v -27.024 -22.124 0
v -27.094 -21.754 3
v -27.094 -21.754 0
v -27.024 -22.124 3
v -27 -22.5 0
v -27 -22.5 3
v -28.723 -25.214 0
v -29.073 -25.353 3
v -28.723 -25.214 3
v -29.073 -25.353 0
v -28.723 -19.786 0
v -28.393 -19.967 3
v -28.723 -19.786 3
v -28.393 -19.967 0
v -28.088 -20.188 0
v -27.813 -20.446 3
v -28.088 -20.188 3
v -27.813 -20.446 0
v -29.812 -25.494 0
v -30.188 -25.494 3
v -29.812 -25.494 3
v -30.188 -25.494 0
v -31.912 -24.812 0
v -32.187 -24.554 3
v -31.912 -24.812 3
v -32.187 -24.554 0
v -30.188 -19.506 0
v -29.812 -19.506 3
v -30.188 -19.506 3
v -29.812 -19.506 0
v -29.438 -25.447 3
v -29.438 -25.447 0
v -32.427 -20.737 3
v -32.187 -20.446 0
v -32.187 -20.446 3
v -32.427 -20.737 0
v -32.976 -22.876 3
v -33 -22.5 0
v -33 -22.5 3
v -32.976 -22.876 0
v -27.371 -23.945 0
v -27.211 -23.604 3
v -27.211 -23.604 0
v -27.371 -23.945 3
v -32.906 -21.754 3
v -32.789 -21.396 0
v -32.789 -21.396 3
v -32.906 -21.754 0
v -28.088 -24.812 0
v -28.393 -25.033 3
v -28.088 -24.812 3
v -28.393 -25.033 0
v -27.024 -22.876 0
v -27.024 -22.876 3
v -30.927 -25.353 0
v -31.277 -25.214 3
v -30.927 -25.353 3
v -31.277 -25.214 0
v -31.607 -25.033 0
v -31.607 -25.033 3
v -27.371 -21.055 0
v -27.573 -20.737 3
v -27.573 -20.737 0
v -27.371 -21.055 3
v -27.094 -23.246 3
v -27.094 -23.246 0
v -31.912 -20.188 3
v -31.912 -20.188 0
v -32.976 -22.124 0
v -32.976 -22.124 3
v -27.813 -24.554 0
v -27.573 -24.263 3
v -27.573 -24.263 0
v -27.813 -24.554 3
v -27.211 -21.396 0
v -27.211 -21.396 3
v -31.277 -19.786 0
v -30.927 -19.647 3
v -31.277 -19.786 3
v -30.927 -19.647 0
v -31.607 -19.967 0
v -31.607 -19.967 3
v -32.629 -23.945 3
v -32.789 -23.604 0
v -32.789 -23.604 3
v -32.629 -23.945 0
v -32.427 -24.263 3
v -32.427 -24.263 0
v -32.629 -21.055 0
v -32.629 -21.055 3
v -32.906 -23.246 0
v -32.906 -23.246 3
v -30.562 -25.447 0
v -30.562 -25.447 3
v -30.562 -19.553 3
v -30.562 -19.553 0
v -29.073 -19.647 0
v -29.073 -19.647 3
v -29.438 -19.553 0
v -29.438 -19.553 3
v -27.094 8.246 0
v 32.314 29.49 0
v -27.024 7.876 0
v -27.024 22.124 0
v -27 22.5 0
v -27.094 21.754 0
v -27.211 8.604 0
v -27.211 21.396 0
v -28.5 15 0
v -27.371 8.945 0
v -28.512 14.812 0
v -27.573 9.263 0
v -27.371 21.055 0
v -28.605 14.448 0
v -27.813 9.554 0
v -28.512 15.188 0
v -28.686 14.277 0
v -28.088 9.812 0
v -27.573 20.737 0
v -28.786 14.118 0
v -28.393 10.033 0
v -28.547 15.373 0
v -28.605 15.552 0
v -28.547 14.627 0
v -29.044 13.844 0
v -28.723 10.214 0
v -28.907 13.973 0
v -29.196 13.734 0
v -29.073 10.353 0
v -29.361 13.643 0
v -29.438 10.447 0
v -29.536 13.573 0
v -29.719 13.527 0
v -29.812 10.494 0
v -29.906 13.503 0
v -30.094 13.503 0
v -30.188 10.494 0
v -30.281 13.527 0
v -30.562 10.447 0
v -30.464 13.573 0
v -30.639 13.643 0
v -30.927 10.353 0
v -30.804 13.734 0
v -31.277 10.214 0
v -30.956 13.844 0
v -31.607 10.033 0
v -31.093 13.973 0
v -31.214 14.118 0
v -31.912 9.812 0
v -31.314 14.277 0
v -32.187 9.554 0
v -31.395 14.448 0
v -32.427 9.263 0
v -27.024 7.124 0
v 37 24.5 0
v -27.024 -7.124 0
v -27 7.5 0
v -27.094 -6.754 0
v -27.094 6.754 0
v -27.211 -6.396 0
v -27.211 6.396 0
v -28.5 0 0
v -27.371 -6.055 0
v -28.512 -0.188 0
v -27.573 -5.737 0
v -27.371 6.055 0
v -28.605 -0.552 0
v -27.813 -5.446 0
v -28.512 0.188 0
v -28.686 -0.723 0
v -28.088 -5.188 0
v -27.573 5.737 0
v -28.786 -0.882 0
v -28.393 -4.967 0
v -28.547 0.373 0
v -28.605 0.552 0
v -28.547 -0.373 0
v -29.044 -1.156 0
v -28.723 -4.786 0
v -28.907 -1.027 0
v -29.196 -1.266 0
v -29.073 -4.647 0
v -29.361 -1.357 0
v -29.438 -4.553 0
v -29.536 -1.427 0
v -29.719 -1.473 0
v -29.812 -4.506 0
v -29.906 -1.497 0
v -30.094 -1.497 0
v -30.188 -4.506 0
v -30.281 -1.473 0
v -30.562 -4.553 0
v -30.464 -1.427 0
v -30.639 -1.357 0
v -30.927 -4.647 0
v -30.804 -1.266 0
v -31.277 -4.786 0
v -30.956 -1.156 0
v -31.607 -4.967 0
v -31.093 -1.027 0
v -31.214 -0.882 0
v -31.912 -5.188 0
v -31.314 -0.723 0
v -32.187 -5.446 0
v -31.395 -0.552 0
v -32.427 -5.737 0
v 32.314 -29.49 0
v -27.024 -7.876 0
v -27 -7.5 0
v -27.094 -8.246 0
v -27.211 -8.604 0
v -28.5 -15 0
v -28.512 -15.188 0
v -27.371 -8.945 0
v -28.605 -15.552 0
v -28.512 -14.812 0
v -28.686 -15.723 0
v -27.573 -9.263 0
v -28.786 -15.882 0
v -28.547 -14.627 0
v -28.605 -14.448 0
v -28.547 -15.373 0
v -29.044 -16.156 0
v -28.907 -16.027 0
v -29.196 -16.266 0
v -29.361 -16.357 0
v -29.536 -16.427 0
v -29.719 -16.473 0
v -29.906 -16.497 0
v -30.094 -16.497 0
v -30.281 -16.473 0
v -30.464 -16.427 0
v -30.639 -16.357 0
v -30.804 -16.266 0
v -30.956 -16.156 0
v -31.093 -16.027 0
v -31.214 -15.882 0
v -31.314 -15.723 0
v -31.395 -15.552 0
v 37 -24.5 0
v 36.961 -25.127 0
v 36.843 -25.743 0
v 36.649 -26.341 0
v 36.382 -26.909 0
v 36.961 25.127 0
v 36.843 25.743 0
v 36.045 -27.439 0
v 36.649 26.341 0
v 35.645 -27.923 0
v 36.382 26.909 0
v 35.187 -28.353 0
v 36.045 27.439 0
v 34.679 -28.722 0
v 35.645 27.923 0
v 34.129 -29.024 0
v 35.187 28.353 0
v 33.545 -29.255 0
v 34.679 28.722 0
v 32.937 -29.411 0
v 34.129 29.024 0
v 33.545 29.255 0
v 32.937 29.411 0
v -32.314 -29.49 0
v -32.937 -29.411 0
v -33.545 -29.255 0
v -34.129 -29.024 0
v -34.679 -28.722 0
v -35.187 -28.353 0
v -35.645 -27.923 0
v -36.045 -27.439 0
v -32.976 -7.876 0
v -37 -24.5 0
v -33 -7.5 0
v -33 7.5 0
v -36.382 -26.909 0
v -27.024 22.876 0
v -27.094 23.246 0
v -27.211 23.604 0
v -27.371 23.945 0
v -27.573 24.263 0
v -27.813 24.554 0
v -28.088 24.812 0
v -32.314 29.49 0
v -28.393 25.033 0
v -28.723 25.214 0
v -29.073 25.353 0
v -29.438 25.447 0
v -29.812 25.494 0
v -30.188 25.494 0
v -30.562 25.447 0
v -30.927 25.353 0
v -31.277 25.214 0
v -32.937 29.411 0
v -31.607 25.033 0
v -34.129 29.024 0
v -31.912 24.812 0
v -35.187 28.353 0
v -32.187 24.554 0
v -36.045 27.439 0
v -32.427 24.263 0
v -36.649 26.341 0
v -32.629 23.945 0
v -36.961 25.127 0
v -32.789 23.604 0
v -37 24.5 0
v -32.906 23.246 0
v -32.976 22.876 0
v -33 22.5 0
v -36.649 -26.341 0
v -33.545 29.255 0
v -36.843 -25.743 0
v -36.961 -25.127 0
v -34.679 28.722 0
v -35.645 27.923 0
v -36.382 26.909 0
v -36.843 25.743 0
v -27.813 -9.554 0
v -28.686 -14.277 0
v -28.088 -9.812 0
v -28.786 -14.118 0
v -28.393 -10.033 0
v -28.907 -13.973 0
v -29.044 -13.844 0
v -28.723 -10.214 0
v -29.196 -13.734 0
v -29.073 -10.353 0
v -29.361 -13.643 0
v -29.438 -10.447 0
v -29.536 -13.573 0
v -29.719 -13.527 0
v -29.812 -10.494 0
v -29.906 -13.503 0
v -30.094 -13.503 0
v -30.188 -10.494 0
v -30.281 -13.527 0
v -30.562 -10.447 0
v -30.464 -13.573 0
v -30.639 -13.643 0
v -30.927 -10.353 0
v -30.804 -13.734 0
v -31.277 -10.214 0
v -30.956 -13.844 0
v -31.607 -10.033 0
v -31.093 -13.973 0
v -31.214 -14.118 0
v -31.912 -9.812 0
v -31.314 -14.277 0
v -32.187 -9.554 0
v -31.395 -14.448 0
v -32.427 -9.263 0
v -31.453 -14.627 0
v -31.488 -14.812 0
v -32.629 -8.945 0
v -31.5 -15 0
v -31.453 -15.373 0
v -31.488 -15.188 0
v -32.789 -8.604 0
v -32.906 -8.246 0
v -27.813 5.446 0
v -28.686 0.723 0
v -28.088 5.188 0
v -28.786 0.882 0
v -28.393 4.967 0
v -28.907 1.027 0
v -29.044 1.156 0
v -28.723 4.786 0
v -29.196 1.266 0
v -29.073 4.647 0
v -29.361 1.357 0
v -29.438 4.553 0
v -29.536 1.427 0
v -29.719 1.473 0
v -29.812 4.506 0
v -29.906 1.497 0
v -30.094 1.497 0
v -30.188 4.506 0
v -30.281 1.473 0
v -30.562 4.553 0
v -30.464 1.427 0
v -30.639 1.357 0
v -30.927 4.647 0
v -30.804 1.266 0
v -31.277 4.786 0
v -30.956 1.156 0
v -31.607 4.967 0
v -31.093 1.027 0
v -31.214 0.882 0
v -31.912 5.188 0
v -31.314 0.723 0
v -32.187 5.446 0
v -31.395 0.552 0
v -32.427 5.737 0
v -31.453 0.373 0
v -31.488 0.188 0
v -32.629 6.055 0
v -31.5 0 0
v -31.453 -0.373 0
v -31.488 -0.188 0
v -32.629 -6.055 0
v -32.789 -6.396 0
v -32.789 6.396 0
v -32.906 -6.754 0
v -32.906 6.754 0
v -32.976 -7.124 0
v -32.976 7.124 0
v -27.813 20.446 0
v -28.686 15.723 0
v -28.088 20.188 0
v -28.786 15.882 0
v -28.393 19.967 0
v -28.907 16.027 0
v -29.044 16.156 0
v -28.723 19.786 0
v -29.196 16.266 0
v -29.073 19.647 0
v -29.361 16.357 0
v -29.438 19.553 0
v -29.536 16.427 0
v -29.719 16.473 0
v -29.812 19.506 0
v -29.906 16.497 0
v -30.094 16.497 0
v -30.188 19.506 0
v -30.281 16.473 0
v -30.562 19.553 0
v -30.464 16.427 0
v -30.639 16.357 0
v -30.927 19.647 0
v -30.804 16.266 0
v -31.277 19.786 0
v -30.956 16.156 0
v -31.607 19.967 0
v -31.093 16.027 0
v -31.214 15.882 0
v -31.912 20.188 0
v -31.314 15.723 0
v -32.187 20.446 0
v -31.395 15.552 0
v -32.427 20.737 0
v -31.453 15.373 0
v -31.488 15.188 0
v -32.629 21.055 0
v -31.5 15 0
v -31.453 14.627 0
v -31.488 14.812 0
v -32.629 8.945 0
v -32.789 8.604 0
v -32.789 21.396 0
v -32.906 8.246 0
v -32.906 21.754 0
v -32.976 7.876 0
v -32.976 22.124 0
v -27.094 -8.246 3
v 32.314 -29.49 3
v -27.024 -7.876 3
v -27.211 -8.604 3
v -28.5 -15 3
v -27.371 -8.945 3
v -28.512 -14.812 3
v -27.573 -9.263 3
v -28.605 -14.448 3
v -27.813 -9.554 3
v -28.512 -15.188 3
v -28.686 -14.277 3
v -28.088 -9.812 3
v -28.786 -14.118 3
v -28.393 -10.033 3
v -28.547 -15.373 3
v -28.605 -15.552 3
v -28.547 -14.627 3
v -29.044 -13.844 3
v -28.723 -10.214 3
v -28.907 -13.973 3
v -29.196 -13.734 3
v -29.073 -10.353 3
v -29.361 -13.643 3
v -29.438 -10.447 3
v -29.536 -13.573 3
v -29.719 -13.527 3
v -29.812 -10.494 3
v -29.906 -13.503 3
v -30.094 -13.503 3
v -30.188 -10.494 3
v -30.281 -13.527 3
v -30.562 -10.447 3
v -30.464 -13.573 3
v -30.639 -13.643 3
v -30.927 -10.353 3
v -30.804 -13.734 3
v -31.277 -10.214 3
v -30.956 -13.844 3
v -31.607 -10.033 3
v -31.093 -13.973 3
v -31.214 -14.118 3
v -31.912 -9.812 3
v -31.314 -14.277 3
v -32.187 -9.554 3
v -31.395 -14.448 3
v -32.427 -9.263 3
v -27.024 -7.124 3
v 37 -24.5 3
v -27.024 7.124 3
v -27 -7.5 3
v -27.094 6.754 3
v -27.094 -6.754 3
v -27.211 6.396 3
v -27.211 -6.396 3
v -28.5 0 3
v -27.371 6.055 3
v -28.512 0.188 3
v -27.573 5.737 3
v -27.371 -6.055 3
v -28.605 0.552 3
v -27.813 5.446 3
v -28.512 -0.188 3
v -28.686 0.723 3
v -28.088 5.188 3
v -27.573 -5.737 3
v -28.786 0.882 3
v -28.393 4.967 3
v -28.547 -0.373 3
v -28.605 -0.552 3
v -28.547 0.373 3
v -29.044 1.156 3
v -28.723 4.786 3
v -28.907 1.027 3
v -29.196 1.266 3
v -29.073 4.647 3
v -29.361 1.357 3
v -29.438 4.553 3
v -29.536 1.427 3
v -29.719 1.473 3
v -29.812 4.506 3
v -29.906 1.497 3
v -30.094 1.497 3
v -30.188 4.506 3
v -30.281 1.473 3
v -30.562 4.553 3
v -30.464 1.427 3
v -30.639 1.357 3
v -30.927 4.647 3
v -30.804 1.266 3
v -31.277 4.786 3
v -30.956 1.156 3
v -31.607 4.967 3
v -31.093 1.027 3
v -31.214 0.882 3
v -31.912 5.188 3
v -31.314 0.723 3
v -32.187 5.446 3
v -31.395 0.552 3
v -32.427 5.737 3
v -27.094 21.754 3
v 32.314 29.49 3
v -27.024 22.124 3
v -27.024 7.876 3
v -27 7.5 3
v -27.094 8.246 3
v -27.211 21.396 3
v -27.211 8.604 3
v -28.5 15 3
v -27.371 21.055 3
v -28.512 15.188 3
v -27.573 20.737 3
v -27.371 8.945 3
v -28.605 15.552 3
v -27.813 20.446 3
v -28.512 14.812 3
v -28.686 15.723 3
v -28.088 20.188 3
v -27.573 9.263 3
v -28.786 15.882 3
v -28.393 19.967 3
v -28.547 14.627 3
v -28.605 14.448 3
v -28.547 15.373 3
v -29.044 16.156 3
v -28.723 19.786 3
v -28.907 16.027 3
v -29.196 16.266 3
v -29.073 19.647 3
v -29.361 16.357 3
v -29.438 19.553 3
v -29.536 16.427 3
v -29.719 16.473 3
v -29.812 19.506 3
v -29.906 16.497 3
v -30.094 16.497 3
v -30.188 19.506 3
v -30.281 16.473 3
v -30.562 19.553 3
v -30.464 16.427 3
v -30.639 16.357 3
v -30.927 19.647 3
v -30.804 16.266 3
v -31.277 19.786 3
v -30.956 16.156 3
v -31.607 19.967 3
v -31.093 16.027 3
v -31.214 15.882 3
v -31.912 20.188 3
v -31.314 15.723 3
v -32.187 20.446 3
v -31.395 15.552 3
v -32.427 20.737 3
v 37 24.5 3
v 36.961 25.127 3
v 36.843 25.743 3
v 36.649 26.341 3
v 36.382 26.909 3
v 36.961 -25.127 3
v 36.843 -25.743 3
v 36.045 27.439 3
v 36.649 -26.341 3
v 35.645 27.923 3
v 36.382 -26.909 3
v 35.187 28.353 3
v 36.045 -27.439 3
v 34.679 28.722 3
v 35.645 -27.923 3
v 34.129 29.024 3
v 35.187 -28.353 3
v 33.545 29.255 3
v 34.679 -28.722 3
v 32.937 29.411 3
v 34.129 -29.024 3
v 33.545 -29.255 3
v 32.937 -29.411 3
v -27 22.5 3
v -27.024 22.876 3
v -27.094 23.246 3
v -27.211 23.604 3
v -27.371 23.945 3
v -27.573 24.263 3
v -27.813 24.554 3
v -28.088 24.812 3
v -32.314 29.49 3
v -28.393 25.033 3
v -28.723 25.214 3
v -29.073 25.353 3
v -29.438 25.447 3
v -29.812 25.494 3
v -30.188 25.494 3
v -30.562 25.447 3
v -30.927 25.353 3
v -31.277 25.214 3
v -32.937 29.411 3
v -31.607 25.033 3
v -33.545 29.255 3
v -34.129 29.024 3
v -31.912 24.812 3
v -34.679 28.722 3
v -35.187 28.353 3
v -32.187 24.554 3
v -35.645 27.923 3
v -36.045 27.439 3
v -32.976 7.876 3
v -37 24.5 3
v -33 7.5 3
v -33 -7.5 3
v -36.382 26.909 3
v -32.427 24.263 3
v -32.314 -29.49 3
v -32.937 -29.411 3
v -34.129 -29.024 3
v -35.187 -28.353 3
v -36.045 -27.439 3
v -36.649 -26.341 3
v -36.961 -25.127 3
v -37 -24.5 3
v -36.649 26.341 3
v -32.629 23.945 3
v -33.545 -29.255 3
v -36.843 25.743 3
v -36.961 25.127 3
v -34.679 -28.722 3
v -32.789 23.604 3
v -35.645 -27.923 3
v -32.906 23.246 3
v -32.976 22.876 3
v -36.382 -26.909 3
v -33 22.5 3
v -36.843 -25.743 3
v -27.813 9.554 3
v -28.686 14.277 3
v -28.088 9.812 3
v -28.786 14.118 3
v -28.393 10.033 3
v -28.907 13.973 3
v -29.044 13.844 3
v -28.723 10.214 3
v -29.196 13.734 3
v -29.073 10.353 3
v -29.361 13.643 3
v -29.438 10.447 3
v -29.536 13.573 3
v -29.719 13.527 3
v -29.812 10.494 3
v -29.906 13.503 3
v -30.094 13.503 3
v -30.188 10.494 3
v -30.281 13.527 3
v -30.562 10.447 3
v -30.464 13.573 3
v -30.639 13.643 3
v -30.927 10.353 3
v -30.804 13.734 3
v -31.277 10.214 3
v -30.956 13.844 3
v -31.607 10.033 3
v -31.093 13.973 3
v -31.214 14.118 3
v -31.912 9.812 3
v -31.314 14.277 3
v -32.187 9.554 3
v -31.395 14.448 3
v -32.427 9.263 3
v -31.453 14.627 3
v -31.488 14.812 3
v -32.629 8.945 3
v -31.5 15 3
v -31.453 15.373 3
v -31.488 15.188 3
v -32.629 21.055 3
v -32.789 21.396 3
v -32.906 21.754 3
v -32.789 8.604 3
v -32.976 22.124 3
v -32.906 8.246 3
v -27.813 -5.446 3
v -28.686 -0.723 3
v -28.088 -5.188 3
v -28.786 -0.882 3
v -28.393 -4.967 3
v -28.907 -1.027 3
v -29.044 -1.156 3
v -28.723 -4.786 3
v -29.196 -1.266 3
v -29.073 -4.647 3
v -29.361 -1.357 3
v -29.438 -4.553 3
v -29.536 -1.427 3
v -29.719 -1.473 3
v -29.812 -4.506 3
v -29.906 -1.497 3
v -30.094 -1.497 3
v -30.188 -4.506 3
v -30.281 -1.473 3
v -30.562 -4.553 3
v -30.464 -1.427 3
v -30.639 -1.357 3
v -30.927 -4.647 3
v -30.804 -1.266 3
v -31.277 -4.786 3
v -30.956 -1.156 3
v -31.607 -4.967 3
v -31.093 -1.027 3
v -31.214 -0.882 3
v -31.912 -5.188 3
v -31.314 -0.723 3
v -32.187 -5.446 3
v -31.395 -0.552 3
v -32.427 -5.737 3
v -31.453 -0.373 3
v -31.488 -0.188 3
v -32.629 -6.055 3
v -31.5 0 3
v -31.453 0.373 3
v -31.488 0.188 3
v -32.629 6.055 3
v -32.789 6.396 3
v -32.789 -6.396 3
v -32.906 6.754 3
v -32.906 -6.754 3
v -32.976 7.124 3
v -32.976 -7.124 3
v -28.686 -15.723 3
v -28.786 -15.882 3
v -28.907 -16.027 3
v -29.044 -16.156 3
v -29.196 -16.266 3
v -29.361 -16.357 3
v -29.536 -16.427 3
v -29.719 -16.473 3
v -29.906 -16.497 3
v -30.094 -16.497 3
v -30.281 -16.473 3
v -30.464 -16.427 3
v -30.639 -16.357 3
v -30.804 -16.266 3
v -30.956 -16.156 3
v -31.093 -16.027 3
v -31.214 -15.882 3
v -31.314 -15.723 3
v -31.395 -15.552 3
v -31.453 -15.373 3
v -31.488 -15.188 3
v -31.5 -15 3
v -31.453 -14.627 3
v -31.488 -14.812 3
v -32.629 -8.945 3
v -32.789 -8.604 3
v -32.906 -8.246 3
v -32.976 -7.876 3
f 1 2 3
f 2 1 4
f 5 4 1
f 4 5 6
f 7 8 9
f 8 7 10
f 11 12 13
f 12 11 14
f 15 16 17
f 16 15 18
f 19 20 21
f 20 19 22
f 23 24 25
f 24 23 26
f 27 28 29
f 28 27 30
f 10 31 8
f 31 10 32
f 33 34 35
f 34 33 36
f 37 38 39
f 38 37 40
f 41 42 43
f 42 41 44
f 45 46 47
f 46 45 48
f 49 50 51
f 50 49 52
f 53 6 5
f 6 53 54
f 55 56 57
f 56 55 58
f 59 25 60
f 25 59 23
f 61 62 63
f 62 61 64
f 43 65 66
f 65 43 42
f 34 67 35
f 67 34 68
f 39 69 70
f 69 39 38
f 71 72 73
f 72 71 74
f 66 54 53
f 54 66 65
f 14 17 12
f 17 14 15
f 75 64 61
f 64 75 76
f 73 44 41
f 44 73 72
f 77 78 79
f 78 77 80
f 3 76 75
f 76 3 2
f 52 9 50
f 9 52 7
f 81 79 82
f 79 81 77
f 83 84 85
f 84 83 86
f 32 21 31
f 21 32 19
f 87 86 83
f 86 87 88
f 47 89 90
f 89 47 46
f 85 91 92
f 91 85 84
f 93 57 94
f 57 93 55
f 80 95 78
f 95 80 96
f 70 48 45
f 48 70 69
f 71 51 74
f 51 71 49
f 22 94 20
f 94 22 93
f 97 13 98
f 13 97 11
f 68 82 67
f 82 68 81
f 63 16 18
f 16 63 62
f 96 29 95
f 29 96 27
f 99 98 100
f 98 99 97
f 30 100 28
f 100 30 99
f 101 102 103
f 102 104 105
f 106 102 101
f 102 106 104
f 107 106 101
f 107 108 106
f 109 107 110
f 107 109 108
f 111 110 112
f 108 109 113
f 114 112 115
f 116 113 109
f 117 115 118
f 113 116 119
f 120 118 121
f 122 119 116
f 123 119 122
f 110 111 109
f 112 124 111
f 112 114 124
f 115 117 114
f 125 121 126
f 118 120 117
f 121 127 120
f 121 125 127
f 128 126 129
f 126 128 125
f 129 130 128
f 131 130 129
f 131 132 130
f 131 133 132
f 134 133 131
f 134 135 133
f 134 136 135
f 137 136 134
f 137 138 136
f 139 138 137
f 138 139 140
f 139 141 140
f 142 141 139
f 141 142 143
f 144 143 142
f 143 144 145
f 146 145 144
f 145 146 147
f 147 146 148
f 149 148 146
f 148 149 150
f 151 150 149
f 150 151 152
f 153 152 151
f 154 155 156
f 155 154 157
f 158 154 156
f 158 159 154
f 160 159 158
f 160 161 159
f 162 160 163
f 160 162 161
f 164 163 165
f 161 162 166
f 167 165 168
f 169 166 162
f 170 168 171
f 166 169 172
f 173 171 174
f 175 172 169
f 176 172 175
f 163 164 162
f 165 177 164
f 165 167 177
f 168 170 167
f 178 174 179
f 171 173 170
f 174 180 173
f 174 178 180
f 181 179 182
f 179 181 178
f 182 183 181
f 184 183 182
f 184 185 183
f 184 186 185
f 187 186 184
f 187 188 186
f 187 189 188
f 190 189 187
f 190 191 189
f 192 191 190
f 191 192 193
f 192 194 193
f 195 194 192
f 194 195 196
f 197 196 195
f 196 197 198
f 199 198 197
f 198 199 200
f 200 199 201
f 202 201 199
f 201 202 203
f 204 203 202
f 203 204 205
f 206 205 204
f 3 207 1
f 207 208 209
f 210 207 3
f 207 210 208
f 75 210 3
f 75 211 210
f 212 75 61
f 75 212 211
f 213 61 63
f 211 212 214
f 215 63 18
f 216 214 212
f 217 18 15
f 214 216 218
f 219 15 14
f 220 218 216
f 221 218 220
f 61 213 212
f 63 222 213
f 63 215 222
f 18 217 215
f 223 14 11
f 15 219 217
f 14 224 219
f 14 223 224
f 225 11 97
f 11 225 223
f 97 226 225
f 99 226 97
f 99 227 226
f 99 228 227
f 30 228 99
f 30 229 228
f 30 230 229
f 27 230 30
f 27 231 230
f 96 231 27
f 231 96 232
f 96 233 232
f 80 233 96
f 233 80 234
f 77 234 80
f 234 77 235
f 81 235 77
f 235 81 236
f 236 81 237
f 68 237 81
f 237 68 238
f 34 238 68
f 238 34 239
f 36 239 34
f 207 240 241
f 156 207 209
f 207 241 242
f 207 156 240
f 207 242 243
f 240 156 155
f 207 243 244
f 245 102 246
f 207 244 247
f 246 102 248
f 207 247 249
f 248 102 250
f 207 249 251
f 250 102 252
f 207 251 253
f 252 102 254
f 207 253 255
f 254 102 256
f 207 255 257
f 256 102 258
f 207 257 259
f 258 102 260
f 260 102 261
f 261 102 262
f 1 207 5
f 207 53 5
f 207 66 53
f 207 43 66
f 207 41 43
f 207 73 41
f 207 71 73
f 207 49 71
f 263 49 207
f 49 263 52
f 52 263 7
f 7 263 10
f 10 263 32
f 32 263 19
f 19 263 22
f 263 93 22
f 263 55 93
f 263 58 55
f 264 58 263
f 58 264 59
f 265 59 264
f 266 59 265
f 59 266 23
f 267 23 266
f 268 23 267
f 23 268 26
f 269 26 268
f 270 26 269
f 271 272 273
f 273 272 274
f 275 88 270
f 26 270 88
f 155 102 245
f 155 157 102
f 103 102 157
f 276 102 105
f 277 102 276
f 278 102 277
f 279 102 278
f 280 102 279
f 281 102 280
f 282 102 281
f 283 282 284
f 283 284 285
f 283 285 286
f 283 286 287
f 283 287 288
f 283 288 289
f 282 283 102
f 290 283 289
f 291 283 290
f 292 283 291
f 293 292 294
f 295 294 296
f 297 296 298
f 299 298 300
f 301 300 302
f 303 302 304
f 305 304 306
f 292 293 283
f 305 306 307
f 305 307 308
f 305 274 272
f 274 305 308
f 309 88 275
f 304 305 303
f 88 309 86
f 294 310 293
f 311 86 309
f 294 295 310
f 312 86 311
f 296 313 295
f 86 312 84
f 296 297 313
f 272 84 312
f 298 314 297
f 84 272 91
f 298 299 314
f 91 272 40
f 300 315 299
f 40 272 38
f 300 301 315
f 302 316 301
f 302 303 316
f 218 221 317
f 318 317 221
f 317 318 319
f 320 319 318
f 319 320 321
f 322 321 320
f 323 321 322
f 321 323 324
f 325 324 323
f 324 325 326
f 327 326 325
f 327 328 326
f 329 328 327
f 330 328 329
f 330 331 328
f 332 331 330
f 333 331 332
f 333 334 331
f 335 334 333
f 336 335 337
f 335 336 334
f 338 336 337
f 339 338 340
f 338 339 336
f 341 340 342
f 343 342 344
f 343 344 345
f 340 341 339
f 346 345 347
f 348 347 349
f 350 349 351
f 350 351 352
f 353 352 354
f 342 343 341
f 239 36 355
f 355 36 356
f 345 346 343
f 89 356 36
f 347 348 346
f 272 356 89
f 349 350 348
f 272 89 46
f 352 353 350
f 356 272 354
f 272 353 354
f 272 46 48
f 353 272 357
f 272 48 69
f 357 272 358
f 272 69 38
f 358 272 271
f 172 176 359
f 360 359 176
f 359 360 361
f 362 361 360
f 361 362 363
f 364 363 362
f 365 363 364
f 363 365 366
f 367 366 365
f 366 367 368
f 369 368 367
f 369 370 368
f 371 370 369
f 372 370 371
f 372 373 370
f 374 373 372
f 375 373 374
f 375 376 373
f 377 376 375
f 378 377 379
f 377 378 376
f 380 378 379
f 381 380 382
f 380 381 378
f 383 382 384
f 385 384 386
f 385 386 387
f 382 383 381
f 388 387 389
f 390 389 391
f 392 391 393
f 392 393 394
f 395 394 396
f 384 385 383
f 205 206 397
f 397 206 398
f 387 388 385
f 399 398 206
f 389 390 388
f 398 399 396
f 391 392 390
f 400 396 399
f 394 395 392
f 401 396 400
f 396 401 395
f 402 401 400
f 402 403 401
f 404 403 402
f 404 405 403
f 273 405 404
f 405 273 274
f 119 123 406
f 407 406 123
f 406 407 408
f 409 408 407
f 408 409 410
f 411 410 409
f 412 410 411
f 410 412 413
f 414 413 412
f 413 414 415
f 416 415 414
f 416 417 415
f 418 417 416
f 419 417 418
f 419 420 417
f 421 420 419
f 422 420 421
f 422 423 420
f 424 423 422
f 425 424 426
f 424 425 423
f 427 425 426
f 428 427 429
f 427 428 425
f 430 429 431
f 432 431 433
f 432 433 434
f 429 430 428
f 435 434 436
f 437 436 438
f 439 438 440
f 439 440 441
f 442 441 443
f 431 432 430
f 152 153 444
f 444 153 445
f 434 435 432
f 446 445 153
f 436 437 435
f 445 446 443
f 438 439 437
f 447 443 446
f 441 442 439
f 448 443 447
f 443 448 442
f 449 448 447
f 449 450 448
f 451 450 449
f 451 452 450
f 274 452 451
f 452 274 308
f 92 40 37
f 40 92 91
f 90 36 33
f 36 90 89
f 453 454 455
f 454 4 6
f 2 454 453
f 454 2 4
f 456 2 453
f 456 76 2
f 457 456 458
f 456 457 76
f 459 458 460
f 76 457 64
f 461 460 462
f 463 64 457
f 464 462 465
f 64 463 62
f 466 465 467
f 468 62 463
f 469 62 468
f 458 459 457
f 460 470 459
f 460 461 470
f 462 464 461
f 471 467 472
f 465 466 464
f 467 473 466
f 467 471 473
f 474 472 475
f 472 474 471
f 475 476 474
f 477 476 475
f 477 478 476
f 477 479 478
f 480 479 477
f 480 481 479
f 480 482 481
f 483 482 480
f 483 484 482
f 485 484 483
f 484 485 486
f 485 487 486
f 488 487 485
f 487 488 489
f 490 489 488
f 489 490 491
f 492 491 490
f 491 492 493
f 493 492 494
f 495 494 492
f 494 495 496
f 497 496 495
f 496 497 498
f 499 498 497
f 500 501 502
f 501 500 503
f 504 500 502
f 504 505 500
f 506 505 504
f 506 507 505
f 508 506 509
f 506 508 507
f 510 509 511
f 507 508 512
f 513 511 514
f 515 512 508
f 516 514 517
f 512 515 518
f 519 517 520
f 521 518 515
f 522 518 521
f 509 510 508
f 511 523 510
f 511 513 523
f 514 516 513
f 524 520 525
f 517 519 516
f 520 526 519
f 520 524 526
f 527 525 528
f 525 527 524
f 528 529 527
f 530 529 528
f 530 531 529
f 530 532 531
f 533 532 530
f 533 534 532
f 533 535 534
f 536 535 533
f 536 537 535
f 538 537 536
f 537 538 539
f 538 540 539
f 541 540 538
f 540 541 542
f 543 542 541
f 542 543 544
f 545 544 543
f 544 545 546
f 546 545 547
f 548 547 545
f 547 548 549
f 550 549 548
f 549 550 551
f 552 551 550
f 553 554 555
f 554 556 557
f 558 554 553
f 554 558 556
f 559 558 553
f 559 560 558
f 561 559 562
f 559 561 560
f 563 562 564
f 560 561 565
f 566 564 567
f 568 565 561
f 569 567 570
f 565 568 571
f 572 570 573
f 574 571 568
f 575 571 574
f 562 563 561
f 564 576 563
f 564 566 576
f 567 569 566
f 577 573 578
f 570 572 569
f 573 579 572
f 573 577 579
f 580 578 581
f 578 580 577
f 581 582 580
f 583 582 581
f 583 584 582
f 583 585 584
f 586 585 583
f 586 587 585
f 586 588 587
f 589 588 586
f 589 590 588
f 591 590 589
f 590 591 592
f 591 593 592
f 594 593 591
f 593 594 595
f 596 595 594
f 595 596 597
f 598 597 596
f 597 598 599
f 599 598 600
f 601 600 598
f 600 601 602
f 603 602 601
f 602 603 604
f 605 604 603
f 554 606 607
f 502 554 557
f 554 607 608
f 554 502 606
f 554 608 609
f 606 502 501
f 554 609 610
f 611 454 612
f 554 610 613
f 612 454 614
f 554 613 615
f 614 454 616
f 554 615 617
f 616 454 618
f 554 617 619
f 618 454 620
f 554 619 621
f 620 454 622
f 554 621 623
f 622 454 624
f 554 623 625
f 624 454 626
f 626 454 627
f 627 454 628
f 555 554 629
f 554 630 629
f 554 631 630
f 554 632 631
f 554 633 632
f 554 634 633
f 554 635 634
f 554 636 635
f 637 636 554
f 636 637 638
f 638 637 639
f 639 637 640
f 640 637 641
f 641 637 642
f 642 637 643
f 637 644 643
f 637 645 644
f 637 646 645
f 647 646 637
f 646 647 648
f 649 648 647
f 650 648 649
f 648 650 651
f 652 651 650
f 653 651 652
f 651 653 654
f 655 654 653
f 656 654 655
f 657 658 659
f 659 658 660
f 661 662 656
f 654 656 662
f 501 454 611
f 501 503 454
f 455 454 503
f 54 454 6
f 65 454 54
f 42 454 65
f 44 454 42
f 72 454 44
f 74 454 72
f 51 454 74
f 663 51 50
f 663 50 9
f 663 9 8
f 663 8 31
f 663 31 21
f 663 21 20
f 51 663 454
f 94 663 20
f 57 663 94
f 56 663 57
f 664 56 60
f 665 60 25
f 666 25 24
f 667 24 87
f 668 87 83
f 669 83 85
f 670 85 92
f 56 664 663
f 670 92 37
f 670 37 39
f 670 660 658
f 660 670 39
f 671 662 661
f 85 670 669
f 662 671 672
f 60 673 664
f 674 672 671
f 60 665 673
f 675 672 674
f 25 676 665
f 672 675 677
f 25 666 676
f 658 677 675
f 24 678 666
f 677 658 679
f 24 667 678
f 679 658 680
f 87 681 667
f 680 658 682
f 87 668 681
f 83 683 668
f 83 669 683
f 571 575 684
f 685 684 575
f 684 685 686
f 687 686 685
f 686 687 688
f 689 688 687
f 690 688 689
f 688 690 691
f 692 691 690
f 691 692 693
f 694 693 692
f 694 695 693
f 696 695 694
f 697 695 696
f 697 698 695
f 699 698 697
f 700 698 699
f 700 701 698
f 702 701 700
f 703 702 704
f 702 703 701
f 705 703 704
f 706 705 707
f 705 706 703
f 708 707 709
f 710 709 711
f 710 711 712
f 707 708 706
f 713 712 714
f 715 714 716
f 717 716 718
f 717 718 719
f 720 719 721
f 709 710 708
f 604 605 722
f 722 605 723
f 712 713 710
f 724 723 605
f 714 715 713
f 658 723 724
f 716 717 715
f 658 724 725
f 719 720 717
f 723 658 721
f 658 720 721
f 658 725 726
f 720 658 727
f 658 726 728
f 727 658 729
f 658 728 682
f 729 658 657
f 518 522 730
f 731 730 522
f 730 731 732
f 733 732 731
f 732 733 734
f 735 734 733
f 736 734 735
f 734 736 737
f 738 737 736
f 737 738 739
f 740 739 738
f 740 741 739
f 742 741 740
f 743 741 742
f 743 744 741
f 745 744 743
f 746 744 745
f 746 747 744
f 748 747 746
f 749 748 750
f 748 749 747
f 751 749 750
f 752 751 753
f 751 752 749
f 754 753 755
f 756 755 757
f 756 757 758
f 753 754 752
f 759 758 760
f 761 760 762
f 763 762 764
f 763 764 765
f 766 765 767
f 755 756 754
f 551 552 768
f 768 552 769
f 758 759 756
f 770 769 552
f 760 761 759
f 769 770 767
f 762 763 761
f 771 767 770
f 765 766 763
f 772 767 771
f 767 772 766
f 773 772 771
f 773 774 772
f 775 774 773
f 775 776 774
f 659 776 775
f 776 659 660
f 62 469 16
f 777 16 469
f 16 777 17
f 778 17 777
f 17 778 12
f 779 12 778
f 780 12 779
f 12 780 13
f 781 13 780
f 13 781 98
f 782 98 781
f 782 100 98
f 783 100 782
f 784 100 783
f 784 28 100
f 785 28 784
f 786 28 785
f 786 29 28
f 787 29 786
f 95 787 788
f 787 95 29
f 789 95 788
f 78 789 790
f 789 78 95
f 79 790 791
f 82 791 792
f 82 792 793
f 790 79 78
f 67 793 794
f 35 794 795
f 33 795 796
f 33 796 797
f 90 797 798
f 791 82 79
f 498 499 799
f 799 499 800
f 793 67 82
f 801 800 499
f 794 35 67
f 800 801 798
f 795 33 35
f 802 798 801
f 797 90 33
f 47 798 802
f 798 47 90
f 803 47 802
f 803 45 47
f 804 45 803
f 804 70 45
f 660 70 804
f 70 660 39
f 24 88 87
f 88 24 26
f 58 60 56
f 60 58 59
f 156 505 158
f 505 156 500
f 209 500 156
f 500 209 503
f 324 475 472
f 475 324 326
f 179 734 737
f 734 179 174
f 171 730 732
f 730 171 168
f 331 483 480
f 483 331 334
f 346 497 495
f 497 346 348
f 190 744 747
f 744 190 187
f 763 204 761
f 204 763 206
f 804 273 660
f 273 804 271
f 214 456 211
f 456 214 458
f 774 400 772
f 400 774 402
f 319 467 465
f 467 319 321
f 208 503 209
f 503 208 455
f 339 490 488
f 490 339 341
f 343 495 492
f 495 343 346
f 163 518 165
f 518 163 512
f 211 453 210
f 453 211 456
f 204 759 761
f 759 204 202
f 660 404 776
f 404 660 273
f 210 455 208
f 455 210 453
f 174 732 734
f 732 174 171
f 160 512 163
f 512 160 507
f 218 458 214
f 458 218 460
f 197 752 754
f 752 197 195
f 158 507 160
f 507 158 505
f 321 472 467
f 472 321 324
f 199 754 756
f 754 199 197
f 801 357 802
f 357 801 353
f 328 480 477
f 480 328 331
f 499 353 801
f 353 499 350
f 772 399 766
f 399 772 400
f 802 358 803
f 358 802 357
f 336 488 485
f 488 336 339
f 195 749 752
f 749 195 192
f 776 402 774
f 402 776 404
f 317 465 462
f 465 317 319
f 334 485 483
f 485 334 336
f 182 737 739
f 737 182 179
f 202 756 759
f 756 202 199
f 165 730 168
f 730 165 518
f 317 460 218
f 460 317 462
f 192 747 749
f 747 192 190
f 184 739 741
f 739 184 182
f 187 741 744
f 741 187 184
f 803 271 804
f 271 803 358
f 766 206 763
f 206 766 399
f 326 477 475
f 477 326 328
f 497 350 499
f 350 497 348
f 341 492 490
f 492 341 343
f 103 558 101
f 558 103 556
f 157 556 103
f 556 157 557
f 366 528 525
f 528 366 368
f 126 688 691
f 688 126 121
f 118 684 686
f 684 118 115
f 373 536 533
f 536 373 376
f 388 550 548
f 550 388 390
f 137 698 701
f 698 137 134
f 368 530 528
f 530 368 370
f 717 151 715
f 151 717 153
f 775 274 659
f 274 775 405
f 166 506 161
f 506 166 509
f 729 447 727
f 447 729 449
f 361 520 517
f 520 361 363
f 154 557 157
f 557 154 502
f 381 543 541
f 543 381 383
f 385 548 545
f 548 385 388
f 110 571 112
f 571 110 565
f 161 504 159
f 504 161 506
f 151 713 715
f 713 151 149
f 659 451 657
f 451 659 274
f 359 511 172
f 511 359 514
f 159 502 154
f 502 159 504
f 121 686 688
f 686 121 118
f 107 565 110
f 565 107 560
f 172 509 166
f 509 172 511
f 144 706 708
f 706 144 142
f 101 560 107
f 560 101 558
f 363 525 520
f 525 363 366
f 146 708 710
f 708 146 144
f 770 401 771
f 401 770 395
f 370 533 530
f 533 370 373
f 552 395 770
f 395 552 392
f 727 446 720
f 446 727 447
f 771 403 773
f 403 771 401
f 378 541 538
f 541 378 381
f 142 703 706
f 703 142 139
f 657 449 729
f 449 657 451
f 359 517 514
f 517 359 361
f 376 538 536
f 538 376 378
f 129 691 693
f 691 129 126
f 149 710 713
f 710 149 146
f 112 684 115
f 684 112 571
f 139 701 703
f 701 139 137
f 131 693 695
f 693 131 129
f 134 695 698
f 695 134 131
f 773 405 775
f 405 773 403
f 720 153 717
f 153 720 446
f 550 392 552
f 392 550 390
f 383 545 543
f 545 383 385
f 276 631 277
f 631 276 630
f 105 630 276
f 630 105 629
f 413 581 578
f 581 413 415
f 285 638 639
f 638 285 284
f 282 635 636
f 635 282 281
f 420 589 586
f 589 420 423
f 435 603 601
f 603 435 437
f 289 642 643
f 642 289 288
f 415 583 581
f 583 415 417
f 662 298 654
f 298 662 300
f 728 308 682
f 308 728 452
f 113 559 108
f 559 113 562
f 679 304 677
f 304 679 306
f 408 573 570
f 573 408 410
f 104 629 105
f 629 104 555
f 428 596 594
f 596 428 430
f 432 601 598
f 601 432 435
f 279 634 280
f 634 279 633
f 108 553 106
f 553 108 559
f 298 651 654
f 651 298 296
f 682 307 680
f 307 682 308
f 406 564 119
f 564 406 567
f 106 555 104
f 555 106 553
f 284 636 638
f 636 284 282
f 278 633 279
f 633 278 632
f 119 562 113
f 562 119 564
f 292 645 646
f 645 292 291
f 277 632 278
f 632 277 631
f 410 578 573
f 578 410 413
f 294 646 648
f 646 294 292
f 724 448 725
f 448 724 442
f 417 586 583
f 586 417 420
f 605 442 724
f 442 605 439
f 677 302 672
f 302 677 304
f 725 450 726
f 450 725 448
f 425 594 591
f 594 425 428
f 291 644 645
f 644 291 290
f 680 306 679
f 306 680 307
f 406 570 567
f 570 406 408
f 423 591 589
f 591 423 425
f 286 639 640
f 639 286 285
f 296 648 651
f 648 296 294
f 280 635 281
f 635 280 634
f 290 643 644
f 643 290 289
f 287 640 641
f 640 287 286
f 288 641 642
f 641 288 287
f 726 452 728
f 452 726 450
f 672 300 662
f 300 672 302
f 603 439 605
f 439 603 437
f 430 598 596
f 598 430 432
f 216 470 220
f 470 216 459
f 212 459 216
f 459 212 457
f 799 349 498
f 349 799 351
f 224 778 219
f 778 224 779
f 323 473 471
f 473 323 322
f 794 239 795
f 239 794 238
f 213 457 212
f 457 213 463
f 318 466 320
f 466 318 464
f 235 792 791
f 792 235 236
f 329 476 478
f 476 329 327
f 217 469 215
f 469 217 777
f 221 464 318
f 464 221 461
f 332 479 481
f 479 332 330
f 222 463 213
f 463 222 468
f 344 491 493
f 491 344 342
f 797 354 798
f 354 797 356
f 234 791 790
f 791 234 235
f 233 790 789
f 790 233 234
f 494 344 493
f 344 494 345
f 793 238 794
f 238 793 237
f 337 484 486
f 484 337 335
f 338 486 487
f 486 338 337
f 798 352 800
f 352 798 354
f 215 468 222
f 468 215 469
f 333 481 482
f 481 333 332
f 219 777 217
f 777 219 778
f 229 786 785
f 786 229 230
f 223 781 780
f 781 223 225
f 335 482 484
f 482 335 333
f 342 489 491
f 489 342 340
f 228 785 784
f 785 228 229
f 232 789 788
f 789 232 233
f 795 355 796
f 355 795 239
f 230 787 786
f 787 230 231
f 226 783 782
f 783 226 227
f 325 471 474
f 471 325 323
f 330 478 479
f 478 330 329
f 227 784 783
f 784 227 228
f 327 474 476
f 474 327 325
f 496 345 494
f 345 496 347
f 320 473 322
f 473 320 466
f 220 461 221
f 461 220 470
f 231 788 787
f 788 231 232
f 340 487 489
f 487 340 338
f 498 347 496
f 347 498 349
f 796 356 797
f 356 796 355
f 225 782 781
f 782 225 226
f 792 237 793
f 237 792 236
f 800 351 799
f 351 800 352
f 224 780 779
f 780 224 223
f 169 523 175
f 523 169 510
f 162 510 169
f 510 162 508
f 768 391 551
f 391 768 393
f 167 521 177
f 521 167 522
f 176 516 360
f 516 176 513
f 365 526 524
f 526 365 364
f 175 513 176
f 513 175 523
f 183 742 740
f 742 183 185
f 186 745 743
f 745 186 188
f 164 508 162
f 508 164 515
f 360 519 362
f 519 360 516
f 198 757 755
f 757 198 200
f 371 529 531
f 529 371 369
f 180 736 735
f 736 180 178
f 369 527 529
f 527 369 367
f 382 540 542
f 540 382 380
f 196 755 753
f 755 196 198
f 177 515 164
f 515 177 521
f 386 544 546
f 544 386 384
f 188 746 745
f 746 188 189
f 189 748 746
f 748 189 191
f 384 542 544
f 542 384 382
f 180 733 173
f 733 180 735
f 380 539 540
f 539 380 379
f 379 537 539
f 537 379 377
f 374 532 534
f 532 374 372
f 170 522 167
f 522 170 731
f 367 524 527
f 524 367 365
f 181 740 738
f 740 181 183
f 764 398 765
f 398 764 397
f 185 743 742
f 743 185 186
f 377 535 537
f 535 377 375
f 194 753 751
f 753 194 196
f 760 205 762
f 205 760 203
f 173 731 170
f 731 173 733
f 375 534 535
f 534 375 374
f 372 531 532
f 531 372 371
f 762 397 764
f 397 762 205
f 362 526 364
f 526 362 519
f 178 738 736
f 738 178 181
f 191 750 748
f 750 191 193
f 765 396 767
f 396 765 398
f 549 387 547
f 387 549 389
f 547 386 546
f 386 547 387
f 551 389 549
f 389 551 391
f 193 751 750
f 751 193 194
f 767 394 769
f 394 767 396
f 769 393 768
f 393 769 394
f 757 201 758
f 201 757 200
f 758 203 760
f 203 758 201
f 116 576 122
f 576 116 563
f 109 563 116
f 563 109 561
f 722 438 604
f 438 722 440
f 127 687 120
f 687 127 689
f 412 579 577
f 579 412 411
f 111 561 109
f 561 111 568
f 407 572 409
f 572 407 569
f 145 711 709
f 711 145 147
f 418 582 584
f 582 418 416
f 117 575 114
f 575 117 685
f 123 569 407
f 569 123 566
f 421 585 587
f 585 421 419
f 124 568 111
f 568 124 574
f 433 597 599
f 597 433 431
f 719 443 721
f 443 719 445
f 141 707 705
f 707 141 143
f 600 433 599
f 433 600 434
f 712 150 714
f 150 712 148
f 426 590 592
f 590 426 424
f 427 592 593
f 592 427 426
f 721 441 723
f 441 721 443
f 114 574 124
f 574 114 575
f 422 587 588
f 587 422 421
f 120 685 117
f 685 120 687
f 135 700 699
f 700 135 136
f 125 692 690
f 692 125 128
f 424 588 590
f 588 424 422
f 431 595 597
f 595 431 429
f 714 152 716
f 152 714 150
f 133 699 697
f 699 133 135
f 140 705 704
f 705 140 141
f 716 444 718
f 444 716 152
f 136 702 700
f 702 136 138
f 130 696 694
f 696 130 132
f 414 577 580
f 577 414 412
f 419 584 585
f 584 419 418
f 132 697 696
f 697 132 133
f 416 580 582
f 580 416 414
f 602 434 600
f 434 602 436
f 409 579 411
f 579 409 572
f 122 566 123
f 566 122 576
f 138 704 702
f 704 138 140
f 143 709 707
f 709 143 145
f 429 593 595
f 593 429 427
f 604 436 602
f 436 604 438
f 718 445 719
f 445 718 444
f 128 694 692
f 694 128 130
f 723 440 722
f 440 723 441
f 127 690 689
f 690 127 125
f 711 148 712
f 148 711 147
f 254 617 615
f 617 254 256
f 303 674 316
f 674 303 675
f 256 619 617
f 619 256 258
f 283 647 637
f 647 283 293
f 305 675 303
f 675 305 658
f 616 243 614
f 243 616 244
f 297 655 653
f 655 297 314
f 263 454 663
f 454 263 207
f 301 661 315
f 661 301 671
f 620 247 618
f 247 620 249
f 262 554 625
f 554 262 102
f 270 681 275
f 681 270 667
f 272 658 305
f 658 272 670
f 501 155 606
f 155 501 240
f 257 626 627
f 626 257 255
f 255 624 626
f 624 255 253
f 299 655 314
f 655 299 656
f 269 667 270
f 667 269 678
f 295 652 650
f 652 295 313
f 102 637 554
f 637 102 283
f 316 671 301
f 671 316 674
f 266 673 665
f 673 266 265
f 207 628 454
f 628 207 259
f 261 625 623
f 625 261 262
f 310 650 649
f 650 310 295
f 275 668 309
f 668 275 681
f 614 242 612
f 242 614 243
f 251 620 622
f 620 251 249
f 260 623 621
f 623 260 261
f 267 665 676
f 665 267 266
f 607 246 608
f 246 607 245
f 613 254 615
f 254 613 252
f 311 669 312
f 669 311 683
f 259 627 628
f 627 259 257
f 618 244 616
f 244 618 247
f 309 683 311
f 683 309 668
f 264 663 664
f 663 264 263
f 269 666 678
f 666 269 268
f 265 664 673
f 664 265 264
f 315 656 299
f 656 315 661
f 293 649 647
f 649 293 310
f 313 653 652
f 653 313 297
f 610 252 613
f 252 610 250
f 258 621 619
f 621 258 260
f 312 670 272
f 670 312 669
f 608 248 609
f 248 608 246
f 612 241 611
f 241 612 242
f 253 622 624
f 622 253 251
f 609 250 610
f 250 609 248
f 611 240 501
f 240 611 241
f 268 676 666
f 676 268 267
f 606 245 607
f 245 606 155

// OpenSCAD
$fn = 50;


difference() {
	union() {
		hull() {
			translate(v = [-32.0000000000, 24.5000000000, 0]) {
				cylinder(h = 3, r = 5);
			}
			translate(v = [32.0000000000, 24.5000000000, 0]) {
				cylinder(h = 3, r = 5);
			}
			translate(v = [-32.0000000000, -24.5000000000, 0]) {
				cylinder(h = 3, r = 5);
			}
			translate(v = [32.0000000000, -24.5000000000, 0]) {
				cylinder(h = 3, r = 5);
			}
		}
	}
	union() {
		translate(v = [-30.0000000000, -22.5000000000, 0]) {
			cylinder(h = 3, r = 3.0000000000);
		}
		translate(v = [-30.0000000000, -7.5000000000, 0]) {
			cylinder(h = 3, r = 3.0000000000);
		}
		translate(v = [-30.0000000000, 7.5000000000, 0]) {
			cylinder(h = 3, r = 3.0000000000);
		}
		translate(v = [-30.0000000000, 22.5000000000, 0]) {
			cylinder(h = 3, r = 3.0000000000);
		}
		translate(v = [-30.0000000000, -22.5000000000, 0]) {
			cylinder(h = 3, r = 1.5000000000);
		}
		translate(v = [-30.0000000000, -15.0000000000, 0]) {
			cylinder(h = 3, r = 1.5000000000);
		}
		translate(v = [-30.0000000000, -7.5000000000, 0]) {
			cylinder(h = 3, r = 1.5000000000);
		}
		translate(v = [-30.0000000000, 0.0000000000, 0]) {
			cylinder(h = 3, r = 1.5000000000);
		}
		translate(v = [-30.0000000000, 7.5000000000, 0]) {
			cylinder(h = 3, r = 1.5000000000);
		}
		translate(v = [-30.0000000000, 15.0000000000, 0]) {
			cylinder(h = 3, r = 1.5000000000);
		}
		translate(v = [-30.0000000000, 22.5000000000, 0]) {
			cylinder(h = 3, r = 1.5000000000);
		}
		translate(v = [-30.0000000000, -22.5000000000, 0]) {
			cylinder(h = 3, r = 1.5000000000);
		}
		translate(v = [-30.0000000000, -15.0000000000, 0]) {
			cylinder(h = 3, r = 1.5000000000);
		}
		translate(v = [-30.0000000000, -7.5000000000, 0]) {
			cylinder(h = 3, r = 1.5000000000);
		}
		translate(v = [-30.0000000000, 0.0000000000, 0]) {
			cylinder(h = 3, r = 1.5000000000);
		}
		translate(v = [-30.0000000000, 7.5000000000, 0]) {
			cylinder(h = 3, r = 1.5000000000);
		}
		translate(v = [-30.0000000000, 15.0000000000, 0]) {
			cylinder(h = 3, r = 1.5000000000);
		}
		translate(v = [-30.0000000000, 22.5000000000, 0]) {
			cylinder(h = 3, r = 1.5000000000);
		}
		translate(v = [-30.0000000000, -22.5000000000, 0]) {
			cylinder(h = 3, r = 1.5000000000);
		}
		translate(v = [-30.0000000000, -15.0000000000, 0]) {
			cylinder(h = 3, r = 1.5000000000);
		}
		translate(v = [-30.0000000000, -7.5000000000, 0]) {
			cylinder(h = 3, r = 1.5000000000);
		}
		translate(v = [-30.0000000000, 0.0000000000, 0]) {
			cylinder(h = 3, r = 1.5000000000);
		}
		translate(v = [-30.0000000000, 7.5000000000, 0]) {
			cylinder(h = 3, r = 1.5000000000);
		}
		translate(v = [-30.0000000000, 15.0000000000, 0]) {
			cylinder(h = 3, r = 1.5000000000);
		}
		translate(v = [-30.0000000000, 22.5000000000, 0]) {
			cylinder(h = 3, r = 1.5000000000);
		}
	}
}
